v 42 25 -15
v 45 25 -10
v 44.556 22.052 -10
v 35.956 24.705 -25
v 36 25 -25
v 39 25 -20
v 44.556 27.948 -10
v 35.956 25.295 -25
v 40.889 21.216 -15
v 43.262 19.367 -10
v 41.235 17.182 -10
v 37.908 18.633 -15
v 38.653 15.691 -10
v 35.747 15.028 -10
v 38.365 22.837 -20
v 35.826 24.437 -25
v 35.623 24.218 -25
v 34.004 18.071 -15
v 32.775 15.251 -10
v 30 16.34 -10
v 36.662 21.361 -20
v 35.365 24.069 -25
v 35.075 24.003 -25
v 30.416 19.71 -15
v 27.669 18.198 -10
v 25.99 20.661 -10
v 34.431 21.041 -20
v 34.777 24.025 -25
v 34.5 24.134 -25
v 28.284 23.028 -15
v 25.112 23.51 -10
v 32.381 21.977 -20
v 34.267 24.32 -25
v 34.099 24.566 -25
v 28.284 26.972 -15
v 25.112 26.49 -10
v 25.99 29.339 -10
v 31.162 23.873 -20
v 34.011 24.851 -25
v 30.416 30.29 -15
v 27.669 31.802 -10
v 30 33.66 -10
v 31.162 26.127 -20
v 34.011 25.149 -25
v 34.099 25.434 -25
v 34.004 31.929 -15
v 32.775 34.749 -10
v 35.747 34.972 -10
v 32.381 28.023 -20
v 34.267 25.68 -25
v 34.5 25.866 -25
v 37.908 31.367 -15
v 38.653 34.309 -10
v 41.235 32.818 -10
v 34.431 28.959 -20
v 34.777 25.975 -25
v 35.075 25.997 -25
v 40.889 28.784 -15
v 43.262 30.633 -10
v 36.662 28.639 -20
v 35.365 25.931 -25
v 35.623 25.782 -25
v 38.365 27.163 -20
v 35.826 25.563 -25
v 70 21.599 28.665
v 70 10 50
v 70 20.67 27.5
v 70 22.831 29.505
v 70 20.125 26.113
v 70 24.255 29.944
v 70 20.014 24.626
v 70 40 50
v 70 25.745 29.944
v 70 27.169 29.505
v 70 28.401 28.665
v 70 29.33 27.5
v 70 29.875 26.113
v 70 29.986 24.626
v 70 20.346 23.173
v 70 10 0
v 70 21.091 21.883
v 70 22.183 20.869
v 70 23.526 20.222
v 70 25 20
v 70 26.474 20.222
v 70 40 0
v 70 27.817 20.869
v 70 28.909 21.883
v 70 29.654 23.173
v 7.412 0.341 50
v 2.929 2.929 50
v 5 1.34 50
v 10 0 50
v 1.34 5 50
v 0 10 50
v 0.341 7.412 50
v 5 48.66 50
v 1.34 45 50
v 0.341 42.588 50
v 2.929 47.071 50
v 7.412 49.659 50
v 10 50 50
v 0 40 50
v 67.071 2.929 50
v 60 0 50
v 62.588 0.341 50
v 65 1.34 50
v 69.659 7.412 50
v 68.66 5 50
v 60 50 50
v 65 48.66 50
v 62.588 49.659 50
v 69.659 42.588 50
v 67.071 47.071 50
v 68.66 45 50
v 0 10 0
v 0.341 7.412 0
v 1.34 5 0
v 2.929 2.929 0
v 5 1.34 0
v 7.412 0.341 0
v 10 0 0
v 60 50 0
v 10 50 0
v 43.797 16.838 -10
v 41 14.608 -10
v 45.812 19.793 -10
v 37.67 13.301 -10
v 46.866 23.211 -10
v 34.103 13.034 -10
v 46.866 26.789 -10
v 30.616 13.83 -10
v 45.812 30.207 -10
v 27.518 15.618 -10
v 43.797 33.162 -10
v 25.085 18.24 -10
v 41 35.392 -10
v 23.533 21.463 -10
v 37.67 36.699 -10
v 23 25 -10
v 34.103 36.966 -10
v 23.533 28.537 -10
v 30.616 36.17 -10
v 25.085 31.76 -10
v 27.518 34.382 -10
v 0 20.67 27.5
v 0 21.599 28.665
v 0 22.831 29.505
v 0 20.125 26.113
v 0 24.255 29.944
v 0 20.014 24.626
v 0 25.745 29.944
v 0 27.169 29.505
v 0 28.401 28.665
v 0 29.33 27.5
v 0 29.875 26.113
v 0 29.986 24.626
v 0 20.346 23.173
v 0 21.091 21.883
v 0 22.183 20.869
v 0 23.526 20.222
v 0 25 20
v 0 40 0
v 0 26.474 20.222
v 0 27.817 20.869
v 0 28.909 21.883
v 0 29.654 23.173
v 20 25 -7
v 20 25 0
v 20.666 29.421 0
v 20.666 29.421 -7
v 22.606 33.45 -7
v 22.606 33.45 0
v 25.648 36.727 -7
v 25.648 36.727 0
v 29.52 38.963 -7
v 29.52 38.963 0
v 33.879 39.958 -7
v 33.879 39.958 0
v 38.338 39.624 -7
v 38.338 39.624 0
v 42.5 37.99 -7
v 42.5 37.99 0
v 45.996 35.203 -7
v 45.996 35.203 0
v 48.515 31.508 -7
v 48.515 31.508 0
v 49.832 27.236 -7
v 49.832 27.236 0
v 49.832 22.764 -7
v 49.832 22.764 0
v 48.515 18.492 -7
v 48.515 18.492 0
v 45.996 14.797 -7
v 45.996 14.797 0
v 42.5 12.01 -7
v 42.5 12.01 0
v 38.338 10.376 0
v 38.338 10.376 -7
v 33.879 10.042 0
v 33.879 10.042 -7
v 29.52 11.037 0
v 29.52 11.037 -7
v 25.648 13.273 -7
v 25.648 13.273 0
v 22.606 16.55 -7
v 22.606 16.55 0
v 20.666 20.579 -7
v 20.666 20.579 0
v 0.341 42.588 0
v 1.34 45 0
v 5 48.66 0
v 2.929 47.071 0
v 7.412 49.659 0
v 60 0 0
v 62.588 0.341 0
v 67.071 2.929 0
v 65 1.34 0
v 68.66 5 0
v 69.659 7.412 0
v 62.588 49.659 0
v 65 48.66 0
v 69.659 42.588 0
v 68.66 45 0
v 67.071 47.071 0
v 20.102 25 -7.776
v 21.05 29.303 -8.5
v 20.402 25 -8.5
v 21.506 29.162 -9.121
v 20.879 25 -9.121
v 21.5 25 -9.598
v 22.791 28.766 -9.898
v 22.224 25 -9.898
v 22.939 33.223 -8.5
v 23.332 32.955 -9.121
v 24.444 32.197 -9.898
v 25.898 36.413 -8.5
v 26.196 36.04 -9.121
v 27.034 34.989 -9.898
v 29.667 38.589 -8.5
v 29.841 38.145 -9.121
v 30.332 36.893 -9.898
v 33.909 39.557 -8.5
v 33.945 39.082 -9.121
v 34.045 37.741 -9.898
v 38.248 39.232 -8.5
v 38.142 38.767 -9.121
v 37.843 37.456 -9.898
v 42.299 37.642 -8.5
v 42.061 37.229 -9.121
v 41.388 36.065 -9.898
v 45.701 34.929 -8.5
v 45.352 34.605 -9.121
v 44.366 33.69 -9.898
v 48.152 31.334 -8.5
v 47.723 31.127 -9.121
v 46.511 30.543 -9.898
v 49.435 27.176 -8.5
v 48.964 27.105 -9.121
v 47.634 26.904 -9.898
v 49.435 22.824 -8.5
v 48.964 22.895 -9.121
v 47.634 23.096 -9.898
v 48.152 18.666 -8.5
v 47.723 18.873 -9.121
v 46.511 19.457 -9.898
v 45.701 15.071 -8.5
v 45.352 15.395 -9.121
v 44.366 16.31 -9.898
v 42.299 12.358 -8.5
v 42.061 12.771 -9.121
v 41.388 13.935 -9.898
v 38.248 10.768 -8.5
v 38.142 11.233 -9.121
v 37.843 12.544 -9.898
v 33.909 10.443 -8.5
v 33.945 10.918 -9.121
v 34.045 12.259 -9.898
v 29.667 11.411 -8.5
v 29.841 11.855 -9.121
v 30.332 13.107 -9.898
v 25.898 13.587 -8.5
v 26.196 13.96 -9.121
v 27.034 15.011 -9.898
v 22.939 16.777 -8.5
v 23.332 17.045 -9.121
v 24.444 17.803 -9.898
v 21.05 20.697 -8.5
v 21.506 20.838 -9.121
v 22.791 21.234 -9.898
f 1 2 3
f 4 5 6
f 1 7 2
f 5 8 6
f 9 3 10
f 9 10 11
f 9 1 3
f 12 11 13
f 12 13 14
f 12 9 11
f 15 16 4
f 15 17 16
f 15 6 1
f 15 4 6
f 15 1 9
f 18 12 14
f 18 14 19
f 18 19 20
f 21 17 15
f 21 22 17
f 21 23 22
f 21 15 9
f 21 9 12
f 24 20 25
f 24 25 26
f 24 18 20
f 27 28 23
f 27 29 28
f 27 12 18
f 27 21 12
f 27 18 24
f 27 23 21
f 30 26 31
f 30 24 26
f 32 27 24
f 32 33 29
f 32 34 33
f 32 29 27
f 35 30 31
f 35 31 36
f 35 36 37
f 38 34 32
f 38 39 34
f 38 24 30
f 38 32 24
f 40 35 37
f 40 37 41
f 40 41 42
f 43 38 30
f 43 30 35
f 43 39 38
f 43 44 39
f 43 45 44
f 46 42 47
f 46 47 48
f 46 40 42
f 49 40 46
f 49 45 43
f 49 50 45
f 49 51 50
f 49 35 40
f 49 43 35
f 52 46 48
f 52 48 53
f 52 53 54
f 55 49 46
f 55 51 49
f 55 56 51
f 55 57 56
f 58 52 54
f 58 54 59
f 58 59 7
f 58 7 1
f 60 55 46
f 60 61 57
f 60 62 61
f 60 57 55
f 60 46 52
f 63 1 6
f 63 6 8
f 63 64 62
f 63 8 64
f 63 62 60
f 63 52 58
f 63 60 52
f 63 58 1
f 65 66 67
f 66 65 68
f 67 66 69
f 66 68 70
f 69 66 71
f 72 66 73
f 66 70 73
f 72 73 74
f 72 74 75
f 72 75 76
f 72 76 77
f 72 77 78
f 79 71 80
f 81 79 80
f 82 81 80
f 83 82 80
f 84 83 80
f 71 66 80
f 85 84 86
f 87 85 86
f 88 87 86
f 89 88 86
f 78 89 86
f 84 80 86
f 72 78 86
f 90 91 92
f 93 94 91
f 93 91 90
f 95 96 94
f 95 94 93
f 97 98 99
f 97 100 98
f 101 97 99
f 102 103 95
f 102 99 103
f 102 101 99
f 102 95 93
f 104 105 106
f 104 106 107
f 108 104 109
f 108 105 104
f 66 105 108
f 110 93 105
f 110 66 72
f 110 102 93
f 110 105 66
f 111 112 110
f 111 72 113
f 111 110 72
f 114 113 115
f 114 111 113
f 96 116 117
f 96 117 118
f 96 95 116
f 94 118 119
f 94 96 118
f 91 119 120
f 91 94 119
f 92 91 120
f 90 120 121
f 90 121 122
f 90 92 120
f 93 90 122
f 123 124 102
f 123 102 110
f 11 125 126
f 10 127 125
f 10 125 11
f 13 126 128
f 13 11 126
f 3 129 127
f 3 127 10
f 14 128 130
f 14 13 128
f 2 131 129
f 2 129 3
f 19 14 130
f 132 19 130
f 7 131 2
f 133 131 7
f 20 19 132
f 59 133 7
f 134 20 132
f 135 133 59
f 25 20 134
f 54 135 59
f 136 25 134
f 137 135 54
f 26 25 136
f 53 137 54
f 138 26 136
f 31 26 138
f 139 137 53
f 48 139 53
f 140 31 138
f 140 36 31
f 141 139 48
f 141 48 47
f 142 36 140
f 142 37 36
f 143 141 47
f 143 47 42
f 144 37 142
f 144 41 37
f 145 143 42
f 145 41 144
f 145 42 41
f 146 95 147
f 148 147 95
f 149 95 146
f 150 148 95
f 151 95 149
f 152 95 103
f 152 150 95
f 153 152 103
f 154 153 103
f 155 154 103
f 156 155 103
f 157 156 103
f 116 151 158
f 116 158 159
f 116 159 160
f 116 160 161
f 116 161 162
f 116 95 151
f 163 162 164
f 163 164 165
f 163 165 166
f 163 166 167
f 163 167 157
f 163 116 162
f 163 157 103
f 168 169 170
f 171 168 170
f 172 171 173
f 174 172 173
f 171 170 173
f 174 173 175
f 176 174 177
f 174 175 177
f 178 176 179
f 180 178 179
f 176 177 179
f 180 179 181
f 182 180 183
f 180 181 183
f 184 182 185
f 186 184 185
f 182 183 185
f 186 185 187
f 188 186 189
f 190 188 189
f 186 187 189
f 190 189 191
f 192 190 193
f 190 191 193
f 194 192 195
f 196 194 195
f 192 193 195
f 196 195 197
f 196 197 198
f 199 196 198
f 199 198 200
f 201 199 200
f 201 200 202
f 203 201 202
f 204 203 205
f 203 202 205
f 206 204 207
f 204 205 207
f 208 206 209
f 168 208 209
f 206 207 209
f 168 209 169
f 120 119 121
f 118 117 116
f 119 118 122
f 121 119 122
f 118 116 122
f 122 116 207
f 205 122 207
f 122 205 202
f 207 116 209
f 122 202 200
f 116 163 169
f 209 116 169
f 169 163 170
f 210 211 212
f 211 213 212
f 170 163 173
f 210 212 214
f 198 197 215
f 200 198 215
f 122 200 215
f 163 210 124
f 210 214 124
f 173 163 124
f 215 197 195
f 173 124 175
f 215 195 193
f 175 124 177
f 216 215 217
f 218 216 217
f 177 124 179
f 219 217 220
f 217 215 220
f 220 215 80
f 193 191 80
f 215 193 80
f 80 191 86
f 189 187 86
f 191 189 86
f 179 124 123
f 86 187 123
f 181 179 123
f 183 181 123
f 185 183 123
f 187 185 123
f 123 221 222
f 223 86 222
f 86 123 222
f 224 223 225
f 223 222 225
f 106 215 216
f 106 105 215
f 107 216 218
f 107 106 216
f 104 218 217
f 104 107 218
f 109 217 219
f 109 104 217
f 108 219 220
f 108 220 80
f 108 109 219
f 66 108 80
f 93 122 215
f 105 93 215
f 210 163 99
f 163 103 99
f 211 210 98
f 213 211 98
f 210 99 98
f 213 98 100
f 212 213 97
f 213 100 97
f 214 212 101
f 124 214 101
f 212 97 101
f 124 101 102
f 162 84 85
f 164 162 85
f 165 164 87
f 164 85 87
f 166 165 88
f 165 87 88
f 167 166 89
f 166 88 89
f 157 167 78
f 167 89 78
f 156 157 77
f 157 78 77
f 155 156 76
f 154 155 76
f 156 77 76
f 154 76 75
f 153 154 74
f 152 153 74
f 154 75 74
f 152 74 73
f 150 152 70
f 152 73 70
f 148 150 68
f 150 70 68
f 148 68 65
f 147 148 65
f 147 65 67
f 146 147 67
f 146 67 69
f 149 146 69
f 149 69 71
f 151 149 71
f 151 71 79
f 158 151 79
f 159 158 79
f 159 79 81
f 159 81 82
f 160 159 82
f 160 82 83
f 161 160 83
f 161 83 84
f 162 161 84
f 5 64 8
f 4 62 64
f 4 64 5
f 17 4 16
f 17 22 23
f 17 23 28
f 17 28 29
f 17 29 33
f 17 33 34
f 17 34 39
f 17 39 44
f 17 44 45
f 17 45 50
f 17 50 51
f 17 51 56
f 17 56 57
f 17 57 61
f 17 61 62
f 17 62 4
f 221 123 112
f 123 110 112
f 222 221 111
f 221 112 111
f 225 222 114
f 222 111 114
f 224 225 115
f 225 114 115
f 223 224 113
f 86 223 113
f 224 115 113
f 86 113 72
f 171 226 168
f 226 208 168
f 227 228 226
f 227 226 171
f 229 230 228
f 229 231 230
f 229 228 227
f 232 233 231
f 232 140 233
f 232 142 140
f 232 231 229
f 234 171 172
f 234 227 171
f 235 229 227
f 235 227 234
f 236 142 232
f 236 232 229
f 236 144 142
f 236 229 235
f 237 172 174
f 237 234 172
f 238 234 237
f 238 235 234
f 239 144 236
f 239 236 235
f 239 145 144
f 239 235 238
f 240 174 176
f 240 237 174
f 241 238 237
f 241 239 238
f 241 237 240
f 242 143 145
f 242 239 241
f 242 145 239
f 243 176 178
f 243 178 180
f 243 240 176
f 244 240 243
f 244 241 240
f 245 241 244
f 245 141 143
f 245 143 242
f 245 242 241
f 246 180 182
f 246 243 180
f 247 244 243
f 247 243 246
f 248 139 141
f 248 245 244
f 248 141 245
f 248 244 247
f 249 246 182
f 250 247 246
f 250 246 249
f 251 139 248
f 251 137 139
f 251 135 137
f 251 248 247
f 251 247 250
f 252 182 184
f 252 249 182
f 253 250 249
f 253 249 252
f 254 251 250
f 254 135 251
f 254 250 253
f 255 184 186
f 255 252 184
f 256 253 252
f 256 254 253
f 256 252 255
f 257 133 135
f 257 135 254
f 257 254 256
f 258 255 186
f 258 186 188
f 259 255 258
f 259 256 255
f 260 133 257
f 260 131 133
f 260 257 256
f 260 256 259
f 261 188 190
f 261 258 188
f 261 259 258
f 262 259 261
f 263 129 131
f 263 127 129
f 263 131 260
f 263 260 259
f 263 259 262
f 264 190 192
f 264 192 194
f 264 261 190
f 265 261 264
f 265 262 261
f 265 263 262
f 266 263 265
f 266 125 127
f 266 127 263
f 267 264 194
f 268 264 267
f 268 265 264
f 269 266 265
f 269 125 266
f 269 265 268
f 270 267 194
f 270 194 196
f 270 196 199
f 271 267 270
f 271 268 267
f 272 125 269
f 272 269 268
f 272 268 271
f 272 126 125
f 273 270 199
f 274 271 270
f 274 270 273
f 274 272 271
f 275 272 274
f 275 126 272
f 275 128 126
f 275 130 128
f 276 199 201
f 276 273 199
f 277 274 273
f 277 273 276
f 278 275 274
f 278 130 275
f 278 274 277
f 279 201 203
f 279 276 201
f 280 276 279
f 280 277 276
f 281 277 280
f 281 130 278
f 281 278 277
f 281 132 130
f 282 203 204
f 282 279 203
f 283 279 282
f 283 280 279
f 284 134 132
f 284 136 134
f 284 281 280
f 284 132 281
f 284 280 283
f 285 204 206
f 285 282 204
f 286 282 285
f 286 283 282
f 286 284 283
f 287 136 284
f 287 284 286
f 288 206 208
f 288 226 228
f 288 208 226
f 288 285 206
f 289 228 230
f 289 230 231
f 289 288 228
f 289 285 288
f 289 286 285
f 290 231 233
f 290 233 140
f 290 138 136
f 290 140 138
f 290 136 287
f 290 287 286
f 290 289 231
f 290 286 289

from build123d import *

# Parameters (mm, degrees)
SKETCH1_W           = 70
SKETCH1_H           = 50
BOSS_EXTRUDE1_DEPTH = 50
SKETCH2_R           = 5
CUT_EXTRUDE1_DEPTH  = 100.498743711
SKETCH3_R           = 15
BOSS_EXTRUDE2_DEPTH = 10
FILLET1_R           = 3
FILLET2_R           = 10


with BuildPart() as part:
    # Sketch1 → Boss-Extrude1 (new body)
    with BuildSketch(Plane.XY):
        with Locations((35, 25)):
            Rectangle(SKETCH1_W, SKETCH1_H)
    extrude(amount=BOSS_EXTRUDE1_DEPTH)

    # Sketch2 → Cut-Extrude1 (cut, through all)
    with BuildSketch(Plane(origin=(70, 0, 0), x_dir=(0, 0, -1), z_dir=(1, 0, 0))):
        with Locations((-25, 25)):
            Circle(SKETCH2_R)
    extrude(amount=-CUT_EXTRUDE1_DEPTH, mode=Mode.SUBTRACT)

    # Sketch3 → Boss-Extrude2 (add)
    with BuildSketch(Plane(origin=(0, 0, 0), x_dir=(-1, 0, 0), z_dir=(0, 0, -1))):
        with Locations((-35, 25)):
            Circle(SKETCH3_R)
    extrude(amount=BOSS_EXTRUDE2_DEPTH)

    # Sketch4 → Revolve1 (revolve)
    with BuildSketch(Plane(origin=(35, 0, 0), x_dir=(0, 0, -1), z_dir=(1, 0, 0)), mode=Mode.PRIVATE) as revolve1_sk:
        Polygon((10, 25), (10, 35), (25, 26), (25, 25), align=None)
    revolve(revolve1_sk.sketch.rotate(Axis((35, 25, -10), (0, 0, -1)), 90), axis=Axis((35, 25, -10), (0, 0, -1)))

    # Fillet1
    fillet1_edges = [part.edges().sort_by_distance(p)[0] for p in [
        (50, 25, -10),
    ]]
    fillet(fillet1_edges, radius=FILLET1_R)

    # Fillet2
    fillet2_edges = [part.edges().sort_by_distance(p)[0] for p in [
        (0, 50, 25),
        (70, 50, 25),
        (70, 0, 25),
        (0, 0, 25),
    ]]
    fillet(fillet2_edges, radius=FILLET2_R)


solid = part.part
